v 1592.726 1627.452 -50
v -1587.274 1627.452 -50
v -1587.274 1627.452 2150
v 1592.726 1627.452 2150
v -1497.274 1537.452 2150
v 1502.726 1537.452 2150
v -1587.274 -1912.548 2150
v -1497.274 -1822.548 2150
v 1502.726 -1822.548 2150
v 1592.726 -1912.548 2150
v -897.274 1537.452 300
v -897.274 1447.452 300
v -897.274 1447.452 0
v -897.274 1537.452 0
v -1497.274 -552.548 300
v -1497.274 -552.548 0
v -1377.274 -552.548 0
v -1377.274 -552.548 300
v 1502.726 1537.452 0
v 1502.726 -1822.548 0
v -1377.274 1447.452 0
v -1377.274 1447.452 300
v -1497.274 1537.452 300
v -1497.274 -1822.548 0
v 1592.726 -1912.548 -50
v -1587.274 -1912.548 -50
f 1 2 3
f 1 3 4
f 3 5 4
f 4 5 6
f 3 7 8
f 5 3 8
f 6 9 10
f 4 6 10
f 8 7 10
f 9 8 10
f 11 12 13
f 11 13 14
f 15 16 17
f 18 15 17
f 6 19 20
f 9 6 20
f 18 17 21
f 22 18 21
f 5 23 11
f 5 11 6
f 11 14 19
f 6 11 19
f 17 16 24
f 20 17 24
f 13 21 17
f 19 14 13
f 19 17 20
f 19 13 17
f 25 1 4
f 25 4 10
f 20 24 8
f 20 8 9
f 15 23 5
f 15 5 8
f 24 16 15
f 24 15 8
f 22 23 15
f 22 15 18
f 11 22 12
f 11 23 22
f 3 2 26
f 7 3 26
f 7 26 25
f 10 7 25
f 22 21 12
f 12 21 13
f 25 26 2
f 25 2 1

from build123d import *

# Parameters (mm, degrees)
F0_W      = 3000
F0_H      = 3360
F1_DEPTH  = 50
F2_W      = 600
F2_H      = 90
F3_DEPTH  = 300
F7_W      = 120
F7_H      = 2000
F8_DEPTH  = 300
F10_W     = 3180
F10_H     = 3540
F10_W_2   = 3000
F10_H_2   = 3360
F11_DEPTH = 2200


with BuildPart() as f1:
    # F0 (on Top) → F1 (new body)
    with BuildSketch(Plane.XY):
        with Locations((2.7256049216, -142.5483769343)):
            Rectangle(F0_W, F0_H)
    extrude(amount=-F1_DEPTH)

    # F2 (on face) → F3 (join)
    with BuildSketch(Plane.XY):
        with Locations((-1197.2743950784, 1492.4516230657)):
            Rectangle(F2_W, F2_H)
    extrude(amount=F3_DEPTH)

    # F7 (on face) → F8 (join)
    with BuildSketch(Plane.XY):
        with Locations((-1437.2743950784, 447.4516230657)):
            Rectangle(F7_W, F7_H)
    extrude(amount=F8_DEPTH)

    # F10 (on offset) → F11 (join)
    with BuildSketch(Plane(origin=(0, 0, -50), x_dir=(1, 0, 0), z_dir=(0, 0, -1))):
        with Locations((2.7256049216, 142.5483769343)):
            Rectangle(F10_W, F10_H)
        with Locations((2.7256049216, 142.5483769343)):
            Rectangle(F10_W_2, F10_H_2, mode=Mode.SUBTRACT)
    extrude(amount=-F11_DEPTH)


solid = f1.part
